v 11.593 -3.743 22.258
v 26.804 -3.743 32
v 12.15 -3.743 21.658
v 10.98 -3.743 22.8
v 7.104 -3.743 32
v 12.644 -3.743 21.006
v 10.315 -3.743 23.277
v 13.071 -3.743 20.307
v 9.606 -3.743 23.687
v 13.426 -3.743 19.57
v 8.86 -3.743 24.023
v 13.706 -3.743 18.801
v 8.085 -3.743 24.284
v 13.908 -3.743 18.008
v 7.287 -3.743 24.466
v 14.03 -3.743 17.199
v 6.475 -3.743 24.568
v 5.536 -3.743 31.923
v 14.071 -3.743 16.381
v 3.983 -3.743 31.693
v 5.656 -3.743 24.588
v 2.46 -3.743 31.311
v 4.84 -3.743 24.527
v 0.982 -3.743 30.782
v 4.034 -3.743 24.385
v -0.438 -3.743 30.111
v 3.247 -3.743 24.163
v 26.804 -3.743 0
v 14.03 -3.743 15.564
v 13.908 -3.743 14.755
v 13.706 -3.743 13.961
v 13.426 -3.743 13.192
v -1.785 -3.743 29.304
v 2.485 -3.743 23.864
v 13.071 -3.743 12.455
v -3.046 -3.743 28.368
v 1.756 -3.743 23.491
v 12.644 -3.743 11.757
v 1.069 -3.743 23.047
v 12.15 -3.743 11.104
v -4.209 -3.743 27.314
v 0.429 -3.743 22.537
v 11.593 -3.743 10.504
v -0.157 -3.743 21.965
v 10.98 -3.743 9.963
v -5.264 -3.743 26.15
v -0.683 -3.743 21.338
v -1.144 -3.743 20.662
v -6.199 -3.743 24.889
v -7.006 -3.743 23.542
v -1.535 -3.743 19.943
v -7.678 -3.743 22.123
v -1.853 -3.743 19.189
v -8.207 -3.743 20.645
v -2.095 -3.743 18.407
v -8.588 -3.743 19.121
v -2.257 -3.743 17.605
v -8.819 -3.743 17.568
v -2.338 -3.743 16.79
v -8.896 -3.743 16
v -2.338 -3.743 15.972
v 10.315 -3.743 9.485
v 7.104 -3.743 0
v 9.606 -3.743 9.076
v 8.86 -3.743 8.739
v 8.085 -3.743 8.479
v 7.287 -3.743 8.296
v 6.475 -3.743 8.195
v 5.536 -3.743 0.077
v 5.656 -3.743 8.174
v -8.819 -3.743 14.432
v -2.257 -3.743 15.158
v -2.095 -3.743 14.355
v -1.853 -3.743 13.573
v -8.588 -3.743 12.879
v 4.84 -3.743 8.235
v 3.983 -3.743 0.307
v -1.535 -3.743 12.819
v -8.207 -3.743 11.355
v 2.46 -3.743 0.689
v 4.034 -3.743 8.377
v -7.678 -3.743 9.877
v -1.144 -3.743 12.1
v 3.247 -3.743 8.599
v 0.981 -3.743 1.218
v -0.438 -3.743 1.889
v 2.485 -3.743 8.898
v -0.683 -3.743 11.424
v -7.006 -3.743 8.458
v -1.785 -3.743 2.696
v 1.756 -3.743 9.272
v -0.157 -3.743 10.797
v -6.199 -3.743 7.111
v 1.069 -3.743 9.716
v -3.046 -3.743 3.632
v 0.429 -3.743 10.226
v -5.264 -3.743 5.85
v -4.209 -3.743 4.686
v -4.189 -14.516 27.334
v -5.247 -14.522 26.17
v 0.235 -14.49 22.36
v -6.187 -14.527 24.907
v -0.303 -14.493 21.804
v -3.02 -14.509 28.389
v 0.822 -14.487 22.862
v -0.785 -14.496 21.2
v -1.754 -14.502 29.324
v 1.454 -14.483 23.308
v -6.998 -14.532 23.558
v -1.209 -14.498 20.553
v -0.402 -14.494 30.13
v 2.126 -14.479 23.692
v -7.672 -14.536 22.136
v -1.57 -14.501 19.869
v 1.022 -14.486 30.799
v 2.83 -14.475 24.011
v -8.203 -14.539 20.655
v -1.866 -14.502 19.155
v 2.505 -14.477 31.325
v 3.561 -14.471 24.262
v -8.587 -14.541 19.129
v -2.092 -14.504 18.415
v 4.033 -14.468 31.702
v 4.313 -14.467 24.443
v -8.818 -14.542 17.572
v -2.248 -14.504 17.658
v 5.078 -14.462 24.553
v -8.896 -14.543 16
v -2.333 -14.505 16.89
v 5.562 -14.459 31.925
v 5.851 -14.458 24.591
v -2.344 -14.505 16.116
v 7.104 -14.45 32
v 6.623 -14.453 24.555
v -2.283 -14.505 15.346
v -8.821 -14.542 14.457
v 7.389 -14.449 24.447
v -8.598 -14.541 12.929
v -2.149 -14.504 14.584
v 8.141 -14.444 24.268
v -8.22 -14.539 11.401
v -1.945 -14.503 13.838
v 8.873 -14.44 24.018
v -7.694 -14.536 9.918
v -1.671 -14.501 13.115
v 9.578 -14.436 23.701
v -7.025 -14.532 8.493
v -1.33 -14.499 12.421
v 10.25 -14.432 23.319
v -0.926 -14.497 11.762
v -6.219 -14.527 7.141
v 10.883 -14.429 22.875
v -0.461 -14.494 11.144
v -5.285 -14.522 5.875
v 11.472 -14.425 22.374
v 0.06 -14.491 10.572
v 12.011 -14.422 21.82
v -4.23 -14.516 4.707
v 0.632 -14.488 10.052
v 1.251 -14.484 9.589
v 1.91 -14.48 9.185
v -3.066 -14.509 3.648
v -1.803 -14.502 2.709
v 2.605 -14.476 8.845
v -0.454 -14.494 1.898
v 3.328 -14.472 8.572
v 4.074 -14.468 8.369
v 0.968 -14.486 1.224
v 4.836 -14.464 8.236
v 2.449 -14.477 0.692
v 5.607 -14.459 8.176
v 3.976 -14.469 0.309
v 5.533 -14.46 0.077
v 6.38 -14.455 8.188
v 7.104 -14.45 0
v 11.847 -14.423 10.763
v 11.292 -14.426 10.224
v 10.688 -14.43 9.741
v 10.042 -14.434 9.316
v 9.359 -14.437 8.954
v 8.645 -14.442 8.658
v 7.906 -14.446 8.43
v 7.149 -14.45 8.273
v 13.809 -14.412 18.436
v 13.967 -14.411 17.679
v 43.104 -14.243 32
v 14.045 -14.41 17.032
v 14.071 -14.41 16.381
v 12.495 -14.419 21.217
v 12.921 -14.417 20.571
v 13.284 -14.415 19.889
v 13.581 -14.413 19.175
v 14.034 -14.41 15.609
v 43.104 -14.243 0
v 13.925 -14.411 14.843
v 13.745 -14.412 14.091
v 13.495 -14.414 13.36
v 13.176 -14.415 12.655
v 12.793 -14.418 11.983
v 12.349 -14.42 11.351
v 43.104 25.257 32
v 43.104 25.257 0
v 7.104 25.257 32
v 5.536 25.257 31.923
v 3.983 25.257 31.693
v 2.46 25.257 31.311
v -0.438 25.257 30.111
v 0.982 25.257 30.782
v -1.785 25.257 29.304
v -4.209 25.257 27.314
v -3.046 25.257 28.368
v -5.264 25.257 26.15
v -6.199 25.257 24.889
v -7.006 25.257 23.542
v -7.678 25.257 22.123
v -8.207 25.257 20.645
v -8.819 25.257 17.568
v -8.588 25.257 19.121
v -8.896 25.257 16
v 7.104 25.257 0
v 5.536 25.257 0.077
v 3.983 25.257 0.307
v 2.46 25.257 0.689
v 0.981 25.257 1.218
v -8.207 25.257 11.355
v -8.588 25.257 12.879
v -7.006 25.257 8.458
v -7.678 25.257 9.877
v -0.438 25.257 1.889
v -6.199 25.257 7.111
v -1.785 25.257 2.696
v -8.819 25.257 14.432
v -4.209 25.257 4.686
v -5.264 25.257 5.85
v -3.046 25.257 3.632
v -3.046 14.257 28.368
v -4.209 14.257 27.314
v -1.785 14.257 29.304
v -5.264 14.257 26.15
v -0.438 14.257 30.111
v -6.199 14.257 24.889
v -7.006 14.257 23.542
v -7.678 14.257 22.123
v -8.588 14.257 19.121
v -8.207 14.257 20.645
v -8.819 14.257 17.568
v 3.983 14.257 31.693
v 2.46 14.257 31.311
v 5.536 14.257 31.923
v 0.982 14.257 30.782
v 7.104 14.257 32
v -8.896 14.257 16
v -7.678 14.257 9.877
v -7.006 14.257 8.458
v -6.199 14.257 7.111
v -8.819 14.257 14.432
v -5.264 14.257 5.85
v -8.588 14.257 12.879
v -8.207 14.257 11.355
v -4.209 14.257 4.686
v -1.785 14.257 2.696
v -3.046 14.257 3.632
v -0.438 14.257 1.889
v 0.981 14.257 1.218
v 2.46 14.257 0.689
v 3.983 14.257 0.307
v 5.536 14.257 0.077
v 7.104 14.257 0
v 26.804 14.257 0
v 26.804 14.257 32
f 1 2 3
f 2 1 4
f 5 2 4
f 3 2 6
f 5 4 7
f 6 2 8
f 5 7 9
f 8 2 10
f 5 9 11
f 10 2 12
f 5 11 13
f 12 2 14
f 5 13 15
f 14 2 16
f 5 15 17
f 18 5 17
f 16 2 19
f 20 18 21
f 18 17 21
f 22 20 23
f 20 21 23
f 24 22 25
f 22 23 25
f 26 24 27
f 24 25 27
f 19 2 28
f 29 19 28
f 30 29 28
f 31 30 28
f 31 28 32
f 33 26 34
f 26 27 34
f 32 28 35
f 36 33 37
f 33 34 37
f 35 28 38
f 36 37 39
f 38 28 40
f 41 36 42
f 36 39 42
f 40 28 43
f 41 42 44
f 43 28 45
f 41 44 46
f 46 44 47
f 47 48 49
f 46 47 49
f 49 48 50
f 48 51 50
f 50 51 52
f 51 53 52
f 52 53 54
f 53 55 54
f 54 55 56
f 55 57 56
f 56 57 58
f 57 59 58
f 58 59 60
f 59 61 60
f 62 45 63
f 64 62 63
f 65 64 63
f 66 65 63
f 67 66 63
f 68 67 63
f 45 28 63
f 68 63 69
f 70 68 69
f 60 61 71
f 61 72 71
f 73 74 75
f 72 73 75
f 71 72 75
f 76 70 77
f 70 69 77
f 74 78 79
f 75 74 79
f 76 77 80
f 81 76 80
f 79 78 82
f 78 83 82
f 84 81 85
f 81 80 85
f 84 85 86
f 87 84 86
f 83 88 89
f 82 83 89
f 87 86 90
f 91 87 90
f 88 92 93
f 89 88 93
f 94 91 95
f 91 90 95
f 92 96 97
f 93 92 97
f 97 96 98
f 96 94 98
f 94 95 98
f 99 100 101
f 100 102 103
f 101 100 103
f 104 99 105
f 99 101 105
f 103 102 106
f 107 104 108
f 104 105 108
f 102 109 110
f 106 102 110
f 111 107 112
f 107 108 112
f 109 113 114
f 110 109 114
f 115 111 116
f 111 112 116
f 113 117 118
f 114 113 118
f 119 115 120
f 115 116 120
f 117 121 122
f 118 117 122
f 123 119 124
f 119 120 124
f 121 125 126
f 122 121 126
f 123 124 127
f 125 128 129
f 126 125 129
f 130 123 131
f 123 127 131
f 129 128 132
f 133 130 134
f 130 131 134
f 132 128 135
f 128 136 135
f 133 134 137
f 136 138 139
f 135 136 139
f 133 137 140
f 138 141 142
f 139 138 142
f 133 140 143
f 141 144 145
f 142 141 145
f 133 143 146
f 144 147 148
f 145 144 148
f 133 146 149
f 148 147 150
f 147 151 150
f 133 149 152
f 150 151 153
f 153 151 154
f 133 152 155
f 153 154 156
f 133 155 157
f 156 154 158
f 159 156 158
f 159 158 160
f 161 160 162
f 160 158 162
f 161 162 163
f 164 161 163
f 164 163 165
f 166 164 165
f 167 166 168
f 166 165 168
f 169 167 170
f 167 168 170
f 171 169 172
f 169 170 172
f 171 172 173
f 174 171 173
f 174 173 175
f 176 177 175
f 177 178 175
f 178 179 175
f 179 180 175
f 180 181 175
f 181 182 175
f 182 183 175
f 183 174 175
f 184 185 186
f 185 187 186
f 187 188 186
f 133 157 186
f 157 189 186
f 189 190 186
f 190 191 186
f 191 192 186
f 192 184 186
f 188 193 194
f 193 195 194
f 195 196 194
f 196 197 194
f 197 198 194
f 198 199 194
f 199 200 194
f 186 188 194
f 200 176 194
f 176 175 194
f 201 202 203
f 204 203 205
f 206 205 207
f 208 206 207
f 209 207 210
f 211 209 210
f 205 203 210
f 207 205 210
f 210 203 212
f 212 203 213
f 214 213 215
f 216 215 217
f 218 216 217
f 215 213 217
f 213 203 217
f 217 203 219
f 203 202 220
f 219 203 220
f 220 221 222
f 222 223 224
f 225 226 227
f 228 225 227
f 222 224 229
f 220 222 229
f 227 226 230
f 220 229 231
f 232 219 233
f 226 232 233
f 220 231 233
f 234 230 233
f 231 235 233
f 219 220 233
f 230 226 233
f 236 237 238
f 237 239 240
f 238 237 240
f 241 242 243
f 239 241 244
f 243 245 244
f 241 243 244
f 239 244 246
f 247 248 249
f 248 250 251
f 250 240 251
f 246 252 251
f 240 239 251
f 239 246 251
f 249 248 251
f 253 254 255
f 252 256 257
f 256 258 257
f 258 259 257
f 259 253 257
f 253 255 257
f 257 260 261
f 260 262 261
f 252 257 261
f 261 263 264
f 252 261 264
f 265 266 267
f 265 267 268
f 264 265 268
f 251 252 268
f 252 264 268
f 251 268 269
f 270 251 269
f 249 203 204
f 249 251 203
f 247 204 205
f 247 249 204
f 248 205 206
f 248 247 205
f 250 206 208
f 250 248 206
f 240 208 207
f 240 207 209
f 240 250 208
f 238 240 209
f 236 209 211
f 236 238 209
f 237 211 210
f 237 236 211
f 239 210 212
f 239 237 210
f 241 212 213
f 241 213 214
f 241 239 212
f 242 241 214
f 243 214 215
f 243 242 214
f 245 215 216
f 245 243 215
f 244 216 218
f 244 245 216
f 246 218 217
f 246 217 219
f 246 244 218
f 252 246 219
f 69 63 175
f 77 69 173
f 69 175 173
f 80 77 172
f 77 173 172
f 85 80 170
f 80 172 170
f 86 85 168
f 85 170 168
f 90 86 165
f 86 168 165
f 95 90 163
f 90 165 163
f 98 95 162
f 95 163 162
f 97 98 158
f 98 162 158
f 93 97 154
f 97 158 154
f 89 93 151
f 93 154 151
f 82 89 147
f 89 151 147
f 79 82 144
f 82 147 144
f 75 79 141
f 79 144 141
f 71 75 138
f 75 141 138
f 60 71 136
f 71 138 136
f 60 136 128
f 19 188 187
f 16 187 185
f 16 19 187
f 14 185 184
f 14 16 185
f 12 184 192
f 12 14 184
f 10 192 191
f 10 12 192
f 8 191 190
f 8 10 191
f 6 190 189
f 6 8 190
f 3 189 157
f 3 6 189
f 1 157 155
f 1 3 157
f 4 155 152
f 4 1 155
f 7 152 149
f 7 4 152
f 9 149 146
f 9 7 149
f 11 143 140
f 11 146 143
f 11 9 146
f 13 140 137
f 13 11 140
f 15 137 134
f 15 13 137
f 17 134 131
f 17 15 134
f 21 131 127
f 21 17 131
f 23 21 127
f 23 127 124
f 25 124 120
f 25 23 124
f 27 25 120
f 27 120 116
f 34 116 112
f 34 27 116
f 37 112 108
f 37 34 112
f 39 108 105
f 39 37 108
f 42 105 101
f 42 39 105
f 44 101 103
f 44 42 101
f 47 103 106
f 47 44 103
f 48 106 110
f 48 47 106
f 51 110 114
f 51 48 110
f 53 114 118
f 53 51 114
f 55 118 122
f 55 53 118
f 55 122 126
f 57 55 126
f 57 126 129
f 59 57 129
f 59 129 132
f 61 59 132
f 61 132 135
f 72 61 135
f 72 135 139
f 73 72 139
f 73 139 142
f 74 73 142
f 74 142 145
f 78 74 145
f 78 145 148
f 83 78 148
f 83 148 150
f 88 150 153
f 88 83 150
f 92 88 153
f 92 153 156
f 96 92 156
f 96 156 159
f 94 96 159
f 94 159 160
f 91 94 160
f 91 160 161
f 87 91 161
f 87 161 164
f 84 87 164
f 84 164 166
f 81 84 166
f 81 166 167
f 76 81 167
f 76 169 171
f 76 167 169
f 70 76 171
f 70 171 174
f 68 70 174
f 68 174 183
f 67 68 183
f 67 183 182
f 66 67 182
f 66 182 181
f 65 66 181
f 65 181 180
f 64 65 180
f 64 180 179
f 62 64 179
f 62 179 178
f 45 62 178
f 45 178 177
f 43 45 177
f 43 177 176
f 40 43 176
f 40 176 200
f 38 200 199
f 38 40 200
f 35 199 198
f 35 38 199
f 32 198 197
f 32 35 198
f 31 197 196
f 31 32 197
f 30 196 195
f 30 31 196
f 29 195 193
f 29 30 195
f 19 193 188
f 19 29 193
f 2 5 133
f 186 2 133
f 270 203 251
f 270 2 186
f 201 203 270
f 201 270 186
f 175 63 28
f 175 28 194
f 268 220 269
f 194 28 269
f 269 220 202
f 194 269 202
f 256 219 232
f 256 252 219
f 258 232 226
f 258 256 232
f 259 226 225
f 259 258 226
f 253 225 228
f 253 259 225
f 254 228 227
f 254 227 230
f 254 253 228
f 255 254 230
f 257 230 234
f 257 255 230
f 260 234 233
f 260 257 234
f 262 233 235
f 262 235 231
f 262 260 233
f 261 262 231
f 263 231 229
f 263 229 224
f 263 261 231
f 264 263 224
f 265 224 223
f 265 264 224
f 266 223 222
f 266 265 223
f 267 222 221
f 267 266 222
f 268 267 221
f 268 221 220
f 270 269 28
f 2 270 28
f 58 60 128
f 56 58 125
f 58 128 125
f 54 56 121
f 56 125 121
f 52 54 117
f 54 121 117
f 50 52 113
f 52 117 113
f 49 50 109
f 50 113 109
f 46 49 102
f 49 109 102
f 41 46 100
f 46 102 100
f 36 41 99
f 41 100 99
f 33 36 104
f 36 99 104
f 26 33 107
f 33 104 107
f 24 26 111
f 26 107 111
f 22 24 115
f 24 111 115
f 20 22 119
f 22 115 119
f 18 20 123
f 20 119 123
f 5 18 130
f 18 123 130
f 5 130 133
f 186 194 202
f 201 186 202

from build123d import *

# Parameters (mm, degrees)
F1_DEPTH = 32
F2_R     = 16
F3_R     = 16
F4_R     = 15.99999
F5_R     = 15.99999
F6_R     = 8.20953723
F7_DEPTH = 16


# Not quite as in the source:
# - a fillet or chamfer is up to 0.001 mm smaller than in the source, because OpenCascade refuses the exact size


with BuildPart() as f1:
    # F0 (on Top) → F1 (new body)
    with BuildSketch(Plane.XY):
        Polygon((43.1044374643, -14.2427797436), (43.1044374643, 25.2572197622), (-8.8955625357, 25.2572197622), (-8.8955625357, 14.2572197622), (26.8044351456, 14.2572197622), (26.8044351456, -3.7427802378), (-8.8955625357, -3.7427802378), (-8.8955625357, -14.5427802378), align=None)
    extrude(amount=F1_DEPTH)

    # F2
    f2_edges = [f1.edges().sort_by_distance(p)[0] for p in [
        (-8.895563, -9.14278, 32),
    ]]
    fillet(f2_edges, radius=F2_R)

    # F3
    f3_edges = [f1.edges().sort_by_distance(p)[0] for p in [
        (-8.895563, 19.75722, 32),
    ]]
    fillet(f3_edges, radius=F3_R)

    # F4 (radius 16 in the source; OpenCascade refuses exactly that, so slightly less here)
    f4_edges = [f1.edges().sort_by_distance(p)[0] for p in [
        (-8.895563, 19.75722, 0),
    ]]
    fillet(f4_edges, radius=F4_R)

    # F5 (radius 16 in the source; OpenCascade refuses exactly that, so slightly less here)
    f5_edges = [f1.edges().sort_by_distance(p)[0] for p in [
        (-8.895563, -9.14278, 0),
    ]]
    fillet(f5_edges, radius=F5_R)

    # F6 (on Front) → F7 (cut)
    with BuildSketch(Plane.XZ):
        with Locations((5.8611659333, 16.3812022656)):
            Circle(F6_R)
    extrude(amount=F7_DEPTH, mode=Mode.SUBTRACT)


solid = f1.part
